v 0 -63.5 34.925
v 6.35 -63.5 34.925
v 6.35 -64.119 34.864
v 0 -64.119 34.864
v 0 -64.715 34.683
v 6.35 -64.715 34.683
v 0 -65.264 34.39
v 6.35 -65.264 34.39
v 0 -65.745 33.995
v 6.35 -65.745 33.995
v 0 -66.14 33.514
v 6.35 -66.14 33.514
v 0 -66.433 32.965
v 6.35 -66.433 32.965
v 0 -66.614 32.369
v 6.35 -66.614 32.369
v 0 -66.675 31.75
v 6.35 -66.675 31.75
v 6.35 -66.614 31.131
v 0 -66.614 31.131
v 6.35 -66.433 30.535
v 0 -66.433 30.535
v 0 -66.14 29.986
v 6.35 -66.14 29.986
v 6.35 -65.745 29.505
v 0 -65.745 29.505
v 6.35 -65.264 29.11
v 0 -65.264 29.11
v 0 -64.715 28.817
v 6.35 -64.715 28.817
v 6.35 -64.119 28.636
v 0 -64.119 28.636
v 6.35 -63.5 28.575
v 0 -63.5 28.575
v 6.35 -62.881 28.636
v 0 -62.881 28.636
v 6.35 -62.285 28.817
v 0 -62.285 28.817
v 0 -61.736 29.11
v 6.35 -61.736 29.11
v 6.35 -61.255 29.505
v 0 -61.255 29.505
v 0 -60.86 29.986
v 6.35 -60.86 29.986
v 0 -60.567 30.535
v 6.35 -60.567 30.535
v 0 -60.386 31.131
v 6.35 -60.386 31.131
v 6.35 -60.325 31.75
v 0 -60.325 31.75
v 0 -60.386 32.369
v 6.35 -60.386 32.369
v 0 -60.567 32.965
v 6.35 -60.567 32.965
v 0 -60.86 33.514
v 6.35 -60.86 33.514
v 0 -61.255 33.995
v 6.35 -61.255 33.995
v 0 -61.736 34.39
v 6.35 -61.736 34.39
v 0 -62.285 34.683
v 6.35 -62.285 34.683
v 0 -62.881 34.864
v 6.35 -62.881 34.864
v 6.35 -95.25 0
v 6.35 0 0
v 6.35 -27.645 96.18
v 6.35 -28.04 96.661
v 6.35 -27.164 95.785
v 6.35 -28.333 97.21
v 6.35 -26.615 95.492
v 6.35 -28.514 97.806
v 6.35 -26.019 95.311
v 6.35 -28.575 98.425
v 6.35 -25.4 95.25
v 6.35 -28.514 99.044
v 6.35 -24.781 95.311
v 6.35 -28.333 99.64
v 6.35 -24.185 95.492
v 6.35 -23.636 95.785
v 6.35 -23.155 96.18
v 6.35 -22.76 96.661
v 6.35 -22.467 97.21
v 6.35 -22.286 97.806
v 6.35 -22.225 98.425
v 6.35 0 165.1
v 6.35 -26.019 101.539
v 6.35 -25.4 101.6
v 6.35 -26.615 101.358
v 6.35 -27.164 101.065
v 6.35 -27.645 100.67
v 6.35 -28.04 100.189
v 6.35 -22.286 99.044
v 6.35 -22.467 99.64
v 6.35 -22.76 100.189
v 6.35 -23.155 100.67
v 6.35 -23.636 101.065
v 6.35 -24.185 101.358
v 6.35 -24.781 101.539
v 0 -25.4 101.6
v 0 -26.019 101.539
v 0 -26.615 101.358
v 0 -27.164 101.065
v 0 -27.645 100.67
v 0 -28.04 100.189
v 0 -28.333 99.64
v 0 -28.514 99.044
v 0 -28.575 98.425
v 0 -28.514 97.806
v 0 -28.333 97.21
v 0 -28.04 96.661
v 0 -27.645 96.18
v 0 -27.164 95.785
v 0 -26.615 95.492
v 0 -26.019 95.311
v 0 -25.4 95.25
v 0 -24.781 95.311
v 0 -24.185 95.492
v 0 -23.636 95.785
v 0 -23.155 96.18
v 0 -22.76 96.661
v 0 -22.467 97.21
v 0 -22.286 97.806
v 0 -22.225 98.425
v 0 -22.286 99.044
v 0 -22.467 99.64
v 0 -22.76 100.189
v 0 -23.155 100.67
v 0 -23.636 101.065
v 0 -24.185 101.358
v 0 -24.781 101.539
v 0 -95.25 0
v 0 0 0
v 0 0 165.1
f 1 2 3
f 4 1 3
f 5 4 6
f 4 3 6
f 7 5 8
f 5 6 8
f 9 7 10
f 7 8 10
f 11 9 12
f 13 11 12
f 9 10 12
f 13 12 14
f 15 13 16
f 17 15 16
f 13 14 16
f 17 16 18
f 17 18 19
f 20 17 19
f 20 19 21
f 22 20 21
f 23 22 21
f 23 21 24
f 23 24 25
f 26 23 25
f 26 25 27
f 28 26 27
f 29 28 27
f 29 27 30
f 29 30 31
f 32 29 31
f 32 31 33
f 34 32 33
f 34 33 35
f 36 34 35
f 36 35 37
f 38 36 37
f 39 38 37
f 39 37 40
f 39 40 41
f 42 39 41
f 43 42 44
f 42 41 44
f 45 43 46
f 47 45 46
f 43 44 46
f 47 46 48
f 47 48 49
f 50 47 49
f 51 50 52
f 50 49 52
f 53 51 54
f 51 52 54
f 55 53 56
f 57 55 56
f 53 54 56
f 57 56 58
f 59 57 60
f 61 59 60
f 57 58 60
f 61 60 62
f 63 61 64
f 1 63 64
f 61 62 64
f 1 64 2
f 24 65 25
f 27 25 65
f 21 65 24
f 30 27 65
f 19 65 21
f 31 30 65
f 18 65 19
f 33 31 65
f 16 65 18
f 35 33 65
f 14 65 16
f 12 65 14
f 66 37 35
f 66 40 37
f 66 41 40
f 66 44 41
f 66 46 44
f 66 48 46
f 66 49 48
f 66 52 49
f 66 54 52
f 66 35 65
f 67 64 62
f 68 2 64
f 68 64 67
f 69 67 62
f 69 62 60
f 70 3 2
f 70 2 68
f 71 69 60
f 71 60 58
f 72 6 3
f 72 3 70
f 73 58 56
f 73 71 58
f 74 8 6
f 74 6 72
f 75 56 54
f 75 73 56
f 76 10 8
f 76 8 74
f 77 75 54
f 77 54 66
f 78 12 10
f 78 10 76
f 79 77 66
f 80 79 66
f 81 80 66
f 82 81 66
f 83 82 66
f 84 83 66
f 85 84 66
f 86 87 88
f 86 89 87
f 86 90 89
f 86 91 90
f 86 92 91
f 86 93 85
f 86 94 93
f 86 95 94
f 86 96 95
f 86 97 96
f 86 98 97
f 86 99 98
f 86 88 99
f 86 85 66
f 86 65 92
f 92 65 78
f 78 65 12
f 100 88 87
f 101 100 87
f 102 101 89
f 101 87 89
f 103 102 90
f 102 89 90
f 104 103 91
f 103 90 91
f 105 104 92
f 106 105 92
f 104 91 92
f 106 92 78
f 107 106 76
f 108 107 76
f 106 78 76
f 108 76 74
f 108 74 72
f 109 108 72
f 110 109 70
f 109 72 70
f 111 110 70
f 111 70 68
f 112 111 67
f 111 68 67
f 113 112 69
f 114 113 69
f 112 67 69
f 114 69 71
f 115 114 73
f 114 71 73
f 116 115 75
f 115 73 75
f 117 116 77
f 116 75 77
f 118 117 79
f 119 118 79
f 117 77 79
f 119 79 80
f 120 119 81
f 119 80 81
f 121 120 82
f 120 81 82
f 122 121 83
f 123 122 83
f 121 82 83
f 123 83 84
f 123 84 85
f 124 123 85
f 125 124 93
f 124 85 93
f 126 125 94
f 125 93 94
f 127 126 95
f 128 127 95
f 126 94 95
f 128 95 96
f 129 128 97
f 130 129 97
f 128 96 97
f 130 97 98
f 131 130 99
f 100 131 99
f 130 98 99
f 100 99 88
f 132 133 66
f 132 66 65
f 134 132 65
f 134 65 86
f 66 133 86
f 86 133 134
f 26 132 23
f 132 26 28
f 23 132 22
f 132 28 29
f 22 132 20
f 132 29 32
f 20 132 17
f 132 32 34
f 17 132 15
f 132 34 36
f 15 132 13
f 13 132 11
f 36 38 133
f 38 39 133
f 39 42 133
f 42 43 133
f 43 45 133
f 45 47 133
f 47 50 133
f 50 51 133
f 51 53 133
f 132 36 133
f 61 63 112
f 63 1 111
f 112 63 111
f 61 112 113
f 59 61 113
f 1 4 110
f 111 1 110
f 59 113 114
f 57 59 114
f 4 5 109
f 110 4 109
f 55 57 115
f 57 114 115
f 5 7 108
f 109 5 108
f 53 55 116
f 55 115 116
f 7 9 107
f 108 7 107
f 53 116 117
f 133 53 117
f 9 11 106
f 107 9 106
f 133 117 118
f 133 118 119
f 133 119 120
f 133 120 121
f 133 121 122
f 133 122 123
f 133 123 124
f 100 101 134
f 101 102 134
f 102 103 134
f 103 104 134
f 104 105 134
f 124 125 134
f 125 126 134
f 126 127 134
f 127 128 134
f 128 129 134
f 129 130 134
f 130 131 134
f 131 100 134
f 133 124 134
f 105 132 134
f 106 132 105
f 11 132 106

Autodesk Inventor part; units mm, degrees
ref_plane "YZ Plane" through (0, 0, 0) normal (1, 0, 0) x (0, 1, 0)
ref_plane "XZ Plane" through (0, 0, 0) normal (0, 1, 0) x (-1, 0, 0)
ref_plane "XY Plane" through (0, 0, 0) normal (0, 0, 1) x (1, 0, 0)
sketch "Sketch1" plane through (0, 0, 0) normal (1, 0, 0) x (0, 1, 0)
  line L0 (0, 0) -> (0, 165.1)
  line L1 (0, 0) -> (-95.25, 0)
  line L2 (-95.25, 0) -> (0, 165.1)
  dimension "d0" = 165.1
  dimension "d1" = 95.25
extrude "Extrusion1" add sketch "Sketch1" along normal blind 6.35
sketch "Sketch2" plane through (0, 0, 0) normal (-1, 0, 0) x (0, 0, 1)
  line L0 (0, 0) -> (165.1, 0) projected
  line L1 (0, -95.25) -> (0, 0) projected
  point P0 (98.425, -25.4)
  point P1 (31.75, -63.5)
  dimension "d4" = 25.4
  dimension "d5" = 98.425
  dimension "d6" = 31.75
  dimension "d7" = 63.5
hole "Hole1" at (0, -25.4, 98.425) at (0, -63.5, 31.75) direction (1, 0, 0) diameter 6.35 end through all
properties part number "30deg gusset plate" material "Aluminum 6061"
